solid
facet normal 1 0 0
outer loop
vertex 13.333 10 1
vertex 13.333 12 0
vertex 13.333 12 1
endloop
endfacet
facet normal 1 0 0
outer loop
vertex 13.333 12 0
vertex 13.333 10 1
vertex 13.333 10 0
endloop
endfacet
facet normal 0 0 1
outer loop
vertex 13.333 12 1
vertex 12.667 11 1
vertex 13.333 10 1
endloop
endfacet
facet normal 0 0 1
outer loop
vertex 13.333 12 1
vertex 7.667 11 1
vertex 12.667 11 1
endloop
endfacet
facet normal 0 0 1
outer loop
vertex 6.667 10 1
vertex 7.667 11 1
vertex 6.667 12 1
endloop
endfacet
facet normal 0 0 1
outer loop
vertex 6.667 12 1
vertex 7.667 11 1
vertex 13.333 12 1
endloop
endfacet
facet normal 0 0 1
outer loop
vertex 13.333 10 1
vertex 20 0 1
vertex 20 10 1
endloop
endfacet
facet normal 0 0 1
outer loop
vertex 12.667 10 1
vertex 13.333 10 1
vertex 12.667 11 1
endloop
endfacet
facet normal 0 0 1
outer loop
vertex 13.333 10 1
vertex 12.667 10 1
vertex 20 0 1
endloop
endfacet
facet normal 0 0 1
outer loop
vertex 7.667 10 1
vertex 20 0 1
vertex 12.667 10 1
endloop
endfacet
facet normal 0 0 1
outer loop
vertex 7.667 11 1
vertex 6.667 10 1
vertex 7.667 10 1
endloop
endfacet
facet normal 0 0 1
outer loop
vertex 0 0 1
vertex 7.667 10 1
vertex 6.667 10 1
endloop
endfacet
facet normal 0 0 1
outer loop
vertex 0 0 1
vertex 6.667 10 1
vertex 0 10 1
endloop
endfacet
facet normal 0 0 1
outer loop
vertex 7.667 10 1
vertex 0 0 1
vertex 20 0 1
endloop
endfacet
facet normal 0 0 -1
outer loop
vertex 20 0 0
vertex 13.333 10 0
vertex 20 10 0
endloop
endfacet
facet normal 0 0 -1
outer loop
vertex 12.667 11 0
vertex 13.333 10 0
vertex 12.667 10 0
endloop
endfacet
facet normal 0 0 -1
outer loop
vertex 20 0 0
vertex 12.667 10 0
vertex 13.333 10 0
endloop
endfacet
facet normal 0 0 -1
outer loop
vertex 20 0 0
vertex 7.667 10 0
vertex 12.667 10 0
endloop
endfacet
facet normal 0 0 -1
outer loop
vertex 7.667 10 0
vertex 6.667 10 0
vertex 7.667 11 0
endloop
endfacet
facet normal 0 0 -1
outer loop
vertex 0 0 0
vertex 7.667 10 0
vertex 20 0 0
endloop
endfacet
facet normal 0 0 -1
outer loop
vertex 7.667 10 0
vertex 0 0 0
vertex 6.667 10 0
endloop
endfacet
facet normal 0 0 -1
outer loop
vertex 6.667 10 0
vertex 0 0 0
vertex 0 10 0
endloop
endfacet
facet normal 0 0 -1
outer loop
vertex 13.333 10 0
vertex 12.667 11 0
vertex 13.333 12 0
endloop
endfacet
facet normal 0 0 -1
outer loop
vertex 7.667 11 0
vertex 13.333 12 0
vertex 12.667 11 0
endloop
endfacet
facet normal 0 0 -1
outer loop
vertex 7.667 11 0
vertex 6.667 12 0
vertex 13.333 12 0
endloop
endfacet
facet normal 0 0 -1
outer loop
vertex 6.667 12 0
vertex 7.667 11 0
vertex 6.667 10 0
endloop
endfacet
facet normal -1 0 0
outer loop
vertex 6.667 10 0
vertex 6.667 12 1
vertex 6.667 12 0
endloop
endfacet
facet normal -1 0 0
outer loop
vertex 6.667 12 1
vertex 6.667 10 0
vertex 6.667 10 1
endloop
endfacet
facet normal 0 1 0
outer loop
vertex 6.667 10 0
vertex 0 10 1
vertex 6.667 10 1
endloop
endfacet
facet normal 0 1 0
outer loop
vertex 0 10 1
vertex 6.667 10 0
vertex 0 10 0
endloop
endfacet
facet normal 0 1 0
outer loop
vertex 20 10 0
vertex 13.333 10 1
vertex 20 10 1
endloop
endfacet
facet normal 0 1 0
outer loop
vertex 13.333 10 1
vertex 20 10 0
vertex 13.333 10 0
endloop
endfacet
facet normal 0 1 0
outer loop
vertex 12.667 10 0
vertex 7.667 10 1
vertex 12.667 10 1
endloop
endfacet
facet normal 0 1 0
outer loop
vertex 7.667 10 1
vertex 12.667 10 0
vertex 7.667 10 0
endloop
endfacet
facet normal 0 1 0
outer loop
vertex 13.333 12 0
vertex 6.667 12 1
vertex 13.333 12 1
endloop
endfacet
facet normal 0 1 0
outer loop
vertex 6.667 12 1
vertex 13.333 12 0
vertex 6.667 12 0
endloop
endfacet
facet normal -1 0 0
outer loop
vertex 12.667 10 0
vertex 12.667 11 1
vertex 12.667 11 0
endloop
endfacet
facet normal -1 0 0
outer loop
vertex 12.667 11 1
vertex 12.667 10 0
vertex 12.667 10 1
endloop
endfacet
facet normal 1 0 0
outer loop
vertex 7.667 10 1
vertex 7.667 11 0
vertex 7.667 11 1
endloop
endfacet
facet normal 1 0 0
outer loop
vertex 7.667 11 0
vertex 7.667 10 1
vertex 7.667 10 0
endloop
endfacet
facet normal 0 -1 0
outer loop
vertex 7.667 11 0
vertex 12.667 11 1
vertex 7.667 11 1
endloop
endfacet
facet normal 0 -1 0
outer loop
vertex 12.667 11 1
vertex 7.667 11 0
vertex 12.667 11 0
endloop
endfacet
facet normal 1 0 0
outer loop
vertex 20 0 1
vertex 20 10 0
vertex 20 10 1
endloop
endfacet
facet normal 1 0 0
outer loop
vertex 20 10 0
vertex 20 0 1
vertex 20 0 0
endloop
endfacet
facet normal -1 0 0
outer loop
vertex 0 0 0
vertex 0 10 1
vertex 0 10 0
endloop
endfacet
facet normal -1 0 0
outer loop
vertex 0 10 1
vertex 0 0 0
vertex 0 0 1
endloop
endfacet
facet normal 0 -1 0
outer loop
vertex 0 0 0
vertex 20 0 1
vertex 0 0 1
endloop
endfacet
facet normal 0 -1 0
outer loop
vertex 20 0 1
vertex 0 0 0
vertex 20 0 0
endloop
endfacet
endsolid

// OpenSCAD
/**
 * inside-screen.scad is part of Paper Laptop.
 * It describes the inner side of the lid holding
 * the LCD panel.
 *
 * @author R. S. Doiel, <rsdoiel@gmail.com>
 * copyright (c) 2016 all rights reserved
 * Released under a BSD 2-clause license
 */
module insideScreen(length, width) {
    translate([0, width, 0]) {
        mirror() {
            rotate(180) {
                /* main surface for keyboard mounts */
                color([0,0,1]) cube([length, width, 1]); 
                /* handle extension */
                difference() {
                    translate([length/3, (width/5)*-1, 0]) {
                        color([0,1,0]) cube([length/3, width/5, 1]);
                    }    
                    translate([(length/3)*1.15, (width/10)*-1, 0]) {
                        //color([1,0,0]) 
                        cube([(length/3)*0.75, width/10, 1]);
                    }
                }
            }
        }
    }
}

insideScreen(20, 10);
